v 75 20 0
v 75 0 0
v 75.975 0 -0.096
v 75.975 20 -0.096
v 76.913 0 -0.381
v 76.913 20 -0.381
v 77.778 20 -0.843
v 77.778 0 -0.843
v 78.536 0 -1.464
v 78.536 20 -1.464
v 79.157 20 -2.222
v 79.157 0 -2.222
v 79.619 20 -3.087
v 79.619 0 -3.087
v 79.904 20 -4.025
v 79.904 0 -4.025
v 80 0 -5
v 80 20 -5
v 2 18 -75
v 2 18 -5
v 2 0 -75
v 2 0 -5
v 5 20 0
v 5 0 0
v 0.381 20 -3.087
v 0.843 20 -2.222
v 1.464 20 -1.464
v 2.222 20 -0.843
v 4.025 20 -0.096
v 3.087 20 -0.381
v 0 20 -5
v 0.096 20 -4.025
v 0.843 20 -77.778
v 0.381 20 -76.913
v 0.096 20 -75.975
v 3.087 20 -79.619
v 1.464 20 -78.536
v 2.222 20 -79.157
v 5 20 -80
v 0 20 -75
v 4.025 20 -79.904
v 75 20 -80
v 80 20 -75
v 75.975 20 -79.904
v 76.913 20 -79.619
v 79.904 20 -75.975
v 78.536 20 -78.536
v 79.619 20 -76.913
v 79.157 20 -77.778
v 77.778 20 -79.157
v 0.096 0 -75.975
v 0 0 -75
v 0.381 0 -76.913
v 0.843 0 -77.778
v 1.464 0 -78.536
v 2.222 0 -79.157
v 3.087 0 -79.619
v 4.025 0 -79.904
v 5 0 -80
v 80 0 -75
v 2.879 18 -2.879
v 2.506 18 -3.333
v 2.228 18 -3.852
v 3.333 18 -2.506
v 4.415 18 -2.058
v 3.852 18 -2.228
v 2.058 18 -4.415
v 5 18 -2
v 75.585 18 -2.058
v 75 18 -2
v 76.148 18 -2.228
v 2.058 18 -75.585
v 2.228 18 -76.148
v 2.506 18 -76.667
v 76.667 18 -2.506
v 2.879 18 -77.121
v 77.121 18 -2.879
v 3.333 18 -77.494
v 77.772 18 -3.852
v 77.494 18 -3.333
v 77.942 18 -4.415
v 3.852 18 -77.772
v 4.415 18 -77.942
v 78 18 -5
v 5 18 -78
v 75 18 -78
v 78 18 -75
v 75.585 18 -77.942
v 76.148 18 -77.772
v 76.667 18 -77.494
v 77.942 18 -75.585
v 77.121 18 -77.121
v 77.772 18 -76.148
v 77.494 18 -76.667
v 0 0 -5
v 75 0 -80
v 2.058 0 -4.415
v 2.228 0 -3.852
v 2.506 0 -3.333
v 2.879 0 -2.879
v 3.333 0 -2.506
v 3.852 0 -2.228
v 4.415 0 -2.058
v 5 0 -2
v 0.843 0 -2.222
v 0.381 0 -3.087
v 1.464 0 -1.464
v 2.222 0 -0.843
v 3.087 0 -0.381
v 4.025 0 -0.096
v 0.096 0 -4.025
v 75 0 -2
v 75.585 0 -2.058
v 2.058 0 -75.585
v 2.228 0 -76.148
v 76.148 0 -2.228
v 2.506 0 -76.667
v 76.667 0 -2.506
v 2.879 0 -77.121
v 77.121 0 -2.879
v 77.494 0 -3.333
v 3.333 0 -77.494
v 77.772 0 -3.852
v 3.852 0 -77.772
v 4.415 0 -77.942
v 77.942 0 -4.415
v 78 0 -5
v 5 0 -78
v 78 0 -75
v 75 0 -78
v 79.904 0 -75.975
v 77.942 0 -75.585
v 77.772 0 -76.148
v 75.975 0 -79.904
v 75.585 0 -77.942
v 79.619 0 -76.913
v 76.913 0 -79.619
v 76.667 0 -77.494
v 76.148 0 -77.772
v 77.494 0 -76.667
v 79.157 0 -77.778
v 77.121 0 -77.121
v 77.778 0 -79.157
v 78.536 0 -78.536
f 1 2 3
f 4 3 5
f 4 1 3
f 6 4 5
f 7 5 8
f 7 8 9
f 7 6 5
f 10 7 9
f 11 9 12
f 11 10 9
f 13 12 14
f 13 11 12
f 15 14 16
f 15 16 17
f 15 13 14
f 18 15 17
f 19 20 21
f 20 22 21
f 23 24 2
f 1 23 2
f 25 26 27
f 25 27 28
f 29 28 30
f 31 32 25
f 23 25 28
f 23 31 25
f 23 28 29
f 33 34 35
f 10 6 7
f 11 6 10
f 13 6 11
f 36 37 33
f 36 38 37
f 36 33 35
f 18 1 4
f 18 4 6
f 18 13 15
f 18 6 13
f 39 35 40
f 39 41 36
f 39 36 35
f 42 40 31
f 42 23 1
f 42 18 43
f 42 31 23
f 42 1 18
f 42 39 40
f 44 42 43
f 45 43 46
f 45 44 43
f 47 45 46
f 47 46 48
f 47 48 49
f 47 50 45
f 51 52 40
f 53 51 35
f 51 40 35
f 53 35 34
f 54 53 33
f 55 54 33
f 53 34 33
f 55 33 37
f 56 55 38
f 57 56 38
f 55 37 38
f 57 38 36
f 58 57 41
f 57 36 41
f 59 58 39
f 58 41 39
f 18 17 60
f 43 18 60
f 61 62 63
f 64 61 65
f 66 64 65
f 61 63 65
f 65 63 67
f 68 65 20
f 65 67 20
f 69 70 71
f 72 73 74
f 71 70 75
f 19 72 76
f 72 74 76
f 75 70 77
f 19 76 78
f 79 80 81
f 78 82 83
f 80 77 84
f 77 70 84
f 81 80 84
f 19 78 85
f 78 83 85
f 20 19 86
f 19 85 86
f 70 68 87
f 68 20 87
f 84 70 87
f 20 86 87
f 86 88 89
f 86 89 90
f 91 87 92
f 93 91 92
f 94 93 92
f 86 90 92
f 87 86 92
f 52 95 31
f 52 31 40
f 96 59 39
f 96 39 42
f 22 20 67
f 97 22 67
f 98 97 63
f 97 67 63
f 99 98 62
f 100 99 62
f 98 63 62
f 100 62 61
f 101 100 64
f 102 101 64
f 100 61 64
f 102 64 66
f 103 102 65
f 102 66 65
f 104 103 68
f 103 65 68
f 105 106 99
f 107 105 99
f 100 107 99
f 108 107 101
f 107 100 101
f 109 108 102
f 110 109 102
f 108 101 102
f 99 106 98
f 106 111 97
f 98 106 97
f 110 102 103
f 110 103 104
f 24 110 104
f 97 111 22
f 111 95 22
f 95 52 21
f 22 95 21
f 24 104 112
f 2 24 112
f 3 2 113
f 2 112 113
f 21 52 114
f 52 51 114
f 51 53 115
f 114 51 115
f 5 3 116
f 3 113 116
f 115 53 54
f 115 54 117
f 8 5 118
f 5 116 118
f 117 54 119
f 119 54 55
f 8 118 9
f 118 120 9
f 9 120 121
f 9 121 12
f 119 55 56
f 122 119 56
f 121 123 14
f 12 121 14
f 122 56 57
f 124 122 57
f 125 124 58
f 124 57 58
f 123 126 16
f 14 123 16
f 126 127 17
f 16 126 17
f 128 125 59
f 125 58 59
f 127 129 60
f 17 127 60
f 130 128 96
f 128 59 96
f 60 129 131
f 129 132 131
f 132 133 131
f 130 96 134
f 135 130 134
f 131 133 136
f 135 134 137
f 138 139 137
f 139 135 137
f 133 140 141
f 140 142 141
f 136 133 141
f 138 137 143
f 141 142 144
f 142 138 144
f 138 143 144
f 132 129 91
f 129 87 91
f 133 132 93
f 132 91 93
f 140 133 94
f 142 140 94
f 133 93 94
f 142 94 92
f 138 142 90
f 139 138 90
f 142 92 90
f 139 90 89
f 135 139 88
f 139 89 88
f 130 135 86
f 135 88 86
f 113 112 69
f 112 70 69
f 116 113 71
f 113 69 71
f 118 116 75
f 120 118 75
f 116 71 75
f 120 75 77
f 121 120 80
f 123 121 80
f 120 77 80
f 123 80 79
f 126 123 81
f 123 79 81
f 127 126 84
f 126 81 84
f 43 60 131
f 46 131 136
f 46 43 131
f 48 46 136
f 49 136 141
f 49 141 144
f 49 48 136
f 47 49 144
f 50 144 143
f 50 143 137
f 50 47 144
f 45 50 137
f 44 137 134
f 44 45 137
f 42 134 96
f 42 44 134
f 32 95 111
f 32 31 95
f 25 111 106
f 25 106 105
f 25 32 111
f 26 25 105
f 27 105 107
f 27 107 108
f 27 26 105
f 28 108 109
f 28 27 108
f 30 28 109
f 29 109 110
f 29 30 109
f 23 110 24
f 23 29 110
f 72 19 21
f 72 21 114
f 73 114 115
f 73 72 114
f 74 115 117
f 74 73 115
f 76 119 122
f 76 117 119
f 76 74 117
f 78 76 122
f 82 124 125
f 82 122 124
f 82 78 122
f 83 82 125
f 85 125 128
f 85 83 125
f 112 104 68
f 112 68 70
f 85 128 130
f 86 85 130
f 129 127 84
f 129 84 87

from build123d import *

# Parameters (mm, degrees)
ESQUISSE1_W      = 80
ESQUISSE1_H      = 80
EXTRUSION1_DEPTH = 20
CONG_1_R         = 5
COQUE1_T         = -2


with BuildPart() as part:
    # Esquisse1 → Extrusion1 (new body)
    with BuildSketch(Plane(origin=(0, 0, 0), x_dir=(1, 0, 0), z_dir=(0, 1, 0))):
        with Locations((40, 40)):
            Rectangle(ESQUISSE1_W, ESQUISSE1_H)
    extrude(amount=EXTRUSION1_DEPTH)

    # Congé1
    cong_1_edges = [part.edges().sort_by_distance(p)[0] for p in [
        (0, 10, -80),
        (80, 10, -80),
        (80, 10, 0),
        (0, 10, 0),
    ]]
    fillet(cong_1_edges, radius=CONG_1_R)

    # Coque1
    coque1_openings = [part.faces().sort_by_distance(p)[0] for p in [
        (40, 0, -40),
    ]]
    offset(amount=COQUE1_T, openings=coque1_openings, kind=Kind.INTERSECTION)


solid = part.part
